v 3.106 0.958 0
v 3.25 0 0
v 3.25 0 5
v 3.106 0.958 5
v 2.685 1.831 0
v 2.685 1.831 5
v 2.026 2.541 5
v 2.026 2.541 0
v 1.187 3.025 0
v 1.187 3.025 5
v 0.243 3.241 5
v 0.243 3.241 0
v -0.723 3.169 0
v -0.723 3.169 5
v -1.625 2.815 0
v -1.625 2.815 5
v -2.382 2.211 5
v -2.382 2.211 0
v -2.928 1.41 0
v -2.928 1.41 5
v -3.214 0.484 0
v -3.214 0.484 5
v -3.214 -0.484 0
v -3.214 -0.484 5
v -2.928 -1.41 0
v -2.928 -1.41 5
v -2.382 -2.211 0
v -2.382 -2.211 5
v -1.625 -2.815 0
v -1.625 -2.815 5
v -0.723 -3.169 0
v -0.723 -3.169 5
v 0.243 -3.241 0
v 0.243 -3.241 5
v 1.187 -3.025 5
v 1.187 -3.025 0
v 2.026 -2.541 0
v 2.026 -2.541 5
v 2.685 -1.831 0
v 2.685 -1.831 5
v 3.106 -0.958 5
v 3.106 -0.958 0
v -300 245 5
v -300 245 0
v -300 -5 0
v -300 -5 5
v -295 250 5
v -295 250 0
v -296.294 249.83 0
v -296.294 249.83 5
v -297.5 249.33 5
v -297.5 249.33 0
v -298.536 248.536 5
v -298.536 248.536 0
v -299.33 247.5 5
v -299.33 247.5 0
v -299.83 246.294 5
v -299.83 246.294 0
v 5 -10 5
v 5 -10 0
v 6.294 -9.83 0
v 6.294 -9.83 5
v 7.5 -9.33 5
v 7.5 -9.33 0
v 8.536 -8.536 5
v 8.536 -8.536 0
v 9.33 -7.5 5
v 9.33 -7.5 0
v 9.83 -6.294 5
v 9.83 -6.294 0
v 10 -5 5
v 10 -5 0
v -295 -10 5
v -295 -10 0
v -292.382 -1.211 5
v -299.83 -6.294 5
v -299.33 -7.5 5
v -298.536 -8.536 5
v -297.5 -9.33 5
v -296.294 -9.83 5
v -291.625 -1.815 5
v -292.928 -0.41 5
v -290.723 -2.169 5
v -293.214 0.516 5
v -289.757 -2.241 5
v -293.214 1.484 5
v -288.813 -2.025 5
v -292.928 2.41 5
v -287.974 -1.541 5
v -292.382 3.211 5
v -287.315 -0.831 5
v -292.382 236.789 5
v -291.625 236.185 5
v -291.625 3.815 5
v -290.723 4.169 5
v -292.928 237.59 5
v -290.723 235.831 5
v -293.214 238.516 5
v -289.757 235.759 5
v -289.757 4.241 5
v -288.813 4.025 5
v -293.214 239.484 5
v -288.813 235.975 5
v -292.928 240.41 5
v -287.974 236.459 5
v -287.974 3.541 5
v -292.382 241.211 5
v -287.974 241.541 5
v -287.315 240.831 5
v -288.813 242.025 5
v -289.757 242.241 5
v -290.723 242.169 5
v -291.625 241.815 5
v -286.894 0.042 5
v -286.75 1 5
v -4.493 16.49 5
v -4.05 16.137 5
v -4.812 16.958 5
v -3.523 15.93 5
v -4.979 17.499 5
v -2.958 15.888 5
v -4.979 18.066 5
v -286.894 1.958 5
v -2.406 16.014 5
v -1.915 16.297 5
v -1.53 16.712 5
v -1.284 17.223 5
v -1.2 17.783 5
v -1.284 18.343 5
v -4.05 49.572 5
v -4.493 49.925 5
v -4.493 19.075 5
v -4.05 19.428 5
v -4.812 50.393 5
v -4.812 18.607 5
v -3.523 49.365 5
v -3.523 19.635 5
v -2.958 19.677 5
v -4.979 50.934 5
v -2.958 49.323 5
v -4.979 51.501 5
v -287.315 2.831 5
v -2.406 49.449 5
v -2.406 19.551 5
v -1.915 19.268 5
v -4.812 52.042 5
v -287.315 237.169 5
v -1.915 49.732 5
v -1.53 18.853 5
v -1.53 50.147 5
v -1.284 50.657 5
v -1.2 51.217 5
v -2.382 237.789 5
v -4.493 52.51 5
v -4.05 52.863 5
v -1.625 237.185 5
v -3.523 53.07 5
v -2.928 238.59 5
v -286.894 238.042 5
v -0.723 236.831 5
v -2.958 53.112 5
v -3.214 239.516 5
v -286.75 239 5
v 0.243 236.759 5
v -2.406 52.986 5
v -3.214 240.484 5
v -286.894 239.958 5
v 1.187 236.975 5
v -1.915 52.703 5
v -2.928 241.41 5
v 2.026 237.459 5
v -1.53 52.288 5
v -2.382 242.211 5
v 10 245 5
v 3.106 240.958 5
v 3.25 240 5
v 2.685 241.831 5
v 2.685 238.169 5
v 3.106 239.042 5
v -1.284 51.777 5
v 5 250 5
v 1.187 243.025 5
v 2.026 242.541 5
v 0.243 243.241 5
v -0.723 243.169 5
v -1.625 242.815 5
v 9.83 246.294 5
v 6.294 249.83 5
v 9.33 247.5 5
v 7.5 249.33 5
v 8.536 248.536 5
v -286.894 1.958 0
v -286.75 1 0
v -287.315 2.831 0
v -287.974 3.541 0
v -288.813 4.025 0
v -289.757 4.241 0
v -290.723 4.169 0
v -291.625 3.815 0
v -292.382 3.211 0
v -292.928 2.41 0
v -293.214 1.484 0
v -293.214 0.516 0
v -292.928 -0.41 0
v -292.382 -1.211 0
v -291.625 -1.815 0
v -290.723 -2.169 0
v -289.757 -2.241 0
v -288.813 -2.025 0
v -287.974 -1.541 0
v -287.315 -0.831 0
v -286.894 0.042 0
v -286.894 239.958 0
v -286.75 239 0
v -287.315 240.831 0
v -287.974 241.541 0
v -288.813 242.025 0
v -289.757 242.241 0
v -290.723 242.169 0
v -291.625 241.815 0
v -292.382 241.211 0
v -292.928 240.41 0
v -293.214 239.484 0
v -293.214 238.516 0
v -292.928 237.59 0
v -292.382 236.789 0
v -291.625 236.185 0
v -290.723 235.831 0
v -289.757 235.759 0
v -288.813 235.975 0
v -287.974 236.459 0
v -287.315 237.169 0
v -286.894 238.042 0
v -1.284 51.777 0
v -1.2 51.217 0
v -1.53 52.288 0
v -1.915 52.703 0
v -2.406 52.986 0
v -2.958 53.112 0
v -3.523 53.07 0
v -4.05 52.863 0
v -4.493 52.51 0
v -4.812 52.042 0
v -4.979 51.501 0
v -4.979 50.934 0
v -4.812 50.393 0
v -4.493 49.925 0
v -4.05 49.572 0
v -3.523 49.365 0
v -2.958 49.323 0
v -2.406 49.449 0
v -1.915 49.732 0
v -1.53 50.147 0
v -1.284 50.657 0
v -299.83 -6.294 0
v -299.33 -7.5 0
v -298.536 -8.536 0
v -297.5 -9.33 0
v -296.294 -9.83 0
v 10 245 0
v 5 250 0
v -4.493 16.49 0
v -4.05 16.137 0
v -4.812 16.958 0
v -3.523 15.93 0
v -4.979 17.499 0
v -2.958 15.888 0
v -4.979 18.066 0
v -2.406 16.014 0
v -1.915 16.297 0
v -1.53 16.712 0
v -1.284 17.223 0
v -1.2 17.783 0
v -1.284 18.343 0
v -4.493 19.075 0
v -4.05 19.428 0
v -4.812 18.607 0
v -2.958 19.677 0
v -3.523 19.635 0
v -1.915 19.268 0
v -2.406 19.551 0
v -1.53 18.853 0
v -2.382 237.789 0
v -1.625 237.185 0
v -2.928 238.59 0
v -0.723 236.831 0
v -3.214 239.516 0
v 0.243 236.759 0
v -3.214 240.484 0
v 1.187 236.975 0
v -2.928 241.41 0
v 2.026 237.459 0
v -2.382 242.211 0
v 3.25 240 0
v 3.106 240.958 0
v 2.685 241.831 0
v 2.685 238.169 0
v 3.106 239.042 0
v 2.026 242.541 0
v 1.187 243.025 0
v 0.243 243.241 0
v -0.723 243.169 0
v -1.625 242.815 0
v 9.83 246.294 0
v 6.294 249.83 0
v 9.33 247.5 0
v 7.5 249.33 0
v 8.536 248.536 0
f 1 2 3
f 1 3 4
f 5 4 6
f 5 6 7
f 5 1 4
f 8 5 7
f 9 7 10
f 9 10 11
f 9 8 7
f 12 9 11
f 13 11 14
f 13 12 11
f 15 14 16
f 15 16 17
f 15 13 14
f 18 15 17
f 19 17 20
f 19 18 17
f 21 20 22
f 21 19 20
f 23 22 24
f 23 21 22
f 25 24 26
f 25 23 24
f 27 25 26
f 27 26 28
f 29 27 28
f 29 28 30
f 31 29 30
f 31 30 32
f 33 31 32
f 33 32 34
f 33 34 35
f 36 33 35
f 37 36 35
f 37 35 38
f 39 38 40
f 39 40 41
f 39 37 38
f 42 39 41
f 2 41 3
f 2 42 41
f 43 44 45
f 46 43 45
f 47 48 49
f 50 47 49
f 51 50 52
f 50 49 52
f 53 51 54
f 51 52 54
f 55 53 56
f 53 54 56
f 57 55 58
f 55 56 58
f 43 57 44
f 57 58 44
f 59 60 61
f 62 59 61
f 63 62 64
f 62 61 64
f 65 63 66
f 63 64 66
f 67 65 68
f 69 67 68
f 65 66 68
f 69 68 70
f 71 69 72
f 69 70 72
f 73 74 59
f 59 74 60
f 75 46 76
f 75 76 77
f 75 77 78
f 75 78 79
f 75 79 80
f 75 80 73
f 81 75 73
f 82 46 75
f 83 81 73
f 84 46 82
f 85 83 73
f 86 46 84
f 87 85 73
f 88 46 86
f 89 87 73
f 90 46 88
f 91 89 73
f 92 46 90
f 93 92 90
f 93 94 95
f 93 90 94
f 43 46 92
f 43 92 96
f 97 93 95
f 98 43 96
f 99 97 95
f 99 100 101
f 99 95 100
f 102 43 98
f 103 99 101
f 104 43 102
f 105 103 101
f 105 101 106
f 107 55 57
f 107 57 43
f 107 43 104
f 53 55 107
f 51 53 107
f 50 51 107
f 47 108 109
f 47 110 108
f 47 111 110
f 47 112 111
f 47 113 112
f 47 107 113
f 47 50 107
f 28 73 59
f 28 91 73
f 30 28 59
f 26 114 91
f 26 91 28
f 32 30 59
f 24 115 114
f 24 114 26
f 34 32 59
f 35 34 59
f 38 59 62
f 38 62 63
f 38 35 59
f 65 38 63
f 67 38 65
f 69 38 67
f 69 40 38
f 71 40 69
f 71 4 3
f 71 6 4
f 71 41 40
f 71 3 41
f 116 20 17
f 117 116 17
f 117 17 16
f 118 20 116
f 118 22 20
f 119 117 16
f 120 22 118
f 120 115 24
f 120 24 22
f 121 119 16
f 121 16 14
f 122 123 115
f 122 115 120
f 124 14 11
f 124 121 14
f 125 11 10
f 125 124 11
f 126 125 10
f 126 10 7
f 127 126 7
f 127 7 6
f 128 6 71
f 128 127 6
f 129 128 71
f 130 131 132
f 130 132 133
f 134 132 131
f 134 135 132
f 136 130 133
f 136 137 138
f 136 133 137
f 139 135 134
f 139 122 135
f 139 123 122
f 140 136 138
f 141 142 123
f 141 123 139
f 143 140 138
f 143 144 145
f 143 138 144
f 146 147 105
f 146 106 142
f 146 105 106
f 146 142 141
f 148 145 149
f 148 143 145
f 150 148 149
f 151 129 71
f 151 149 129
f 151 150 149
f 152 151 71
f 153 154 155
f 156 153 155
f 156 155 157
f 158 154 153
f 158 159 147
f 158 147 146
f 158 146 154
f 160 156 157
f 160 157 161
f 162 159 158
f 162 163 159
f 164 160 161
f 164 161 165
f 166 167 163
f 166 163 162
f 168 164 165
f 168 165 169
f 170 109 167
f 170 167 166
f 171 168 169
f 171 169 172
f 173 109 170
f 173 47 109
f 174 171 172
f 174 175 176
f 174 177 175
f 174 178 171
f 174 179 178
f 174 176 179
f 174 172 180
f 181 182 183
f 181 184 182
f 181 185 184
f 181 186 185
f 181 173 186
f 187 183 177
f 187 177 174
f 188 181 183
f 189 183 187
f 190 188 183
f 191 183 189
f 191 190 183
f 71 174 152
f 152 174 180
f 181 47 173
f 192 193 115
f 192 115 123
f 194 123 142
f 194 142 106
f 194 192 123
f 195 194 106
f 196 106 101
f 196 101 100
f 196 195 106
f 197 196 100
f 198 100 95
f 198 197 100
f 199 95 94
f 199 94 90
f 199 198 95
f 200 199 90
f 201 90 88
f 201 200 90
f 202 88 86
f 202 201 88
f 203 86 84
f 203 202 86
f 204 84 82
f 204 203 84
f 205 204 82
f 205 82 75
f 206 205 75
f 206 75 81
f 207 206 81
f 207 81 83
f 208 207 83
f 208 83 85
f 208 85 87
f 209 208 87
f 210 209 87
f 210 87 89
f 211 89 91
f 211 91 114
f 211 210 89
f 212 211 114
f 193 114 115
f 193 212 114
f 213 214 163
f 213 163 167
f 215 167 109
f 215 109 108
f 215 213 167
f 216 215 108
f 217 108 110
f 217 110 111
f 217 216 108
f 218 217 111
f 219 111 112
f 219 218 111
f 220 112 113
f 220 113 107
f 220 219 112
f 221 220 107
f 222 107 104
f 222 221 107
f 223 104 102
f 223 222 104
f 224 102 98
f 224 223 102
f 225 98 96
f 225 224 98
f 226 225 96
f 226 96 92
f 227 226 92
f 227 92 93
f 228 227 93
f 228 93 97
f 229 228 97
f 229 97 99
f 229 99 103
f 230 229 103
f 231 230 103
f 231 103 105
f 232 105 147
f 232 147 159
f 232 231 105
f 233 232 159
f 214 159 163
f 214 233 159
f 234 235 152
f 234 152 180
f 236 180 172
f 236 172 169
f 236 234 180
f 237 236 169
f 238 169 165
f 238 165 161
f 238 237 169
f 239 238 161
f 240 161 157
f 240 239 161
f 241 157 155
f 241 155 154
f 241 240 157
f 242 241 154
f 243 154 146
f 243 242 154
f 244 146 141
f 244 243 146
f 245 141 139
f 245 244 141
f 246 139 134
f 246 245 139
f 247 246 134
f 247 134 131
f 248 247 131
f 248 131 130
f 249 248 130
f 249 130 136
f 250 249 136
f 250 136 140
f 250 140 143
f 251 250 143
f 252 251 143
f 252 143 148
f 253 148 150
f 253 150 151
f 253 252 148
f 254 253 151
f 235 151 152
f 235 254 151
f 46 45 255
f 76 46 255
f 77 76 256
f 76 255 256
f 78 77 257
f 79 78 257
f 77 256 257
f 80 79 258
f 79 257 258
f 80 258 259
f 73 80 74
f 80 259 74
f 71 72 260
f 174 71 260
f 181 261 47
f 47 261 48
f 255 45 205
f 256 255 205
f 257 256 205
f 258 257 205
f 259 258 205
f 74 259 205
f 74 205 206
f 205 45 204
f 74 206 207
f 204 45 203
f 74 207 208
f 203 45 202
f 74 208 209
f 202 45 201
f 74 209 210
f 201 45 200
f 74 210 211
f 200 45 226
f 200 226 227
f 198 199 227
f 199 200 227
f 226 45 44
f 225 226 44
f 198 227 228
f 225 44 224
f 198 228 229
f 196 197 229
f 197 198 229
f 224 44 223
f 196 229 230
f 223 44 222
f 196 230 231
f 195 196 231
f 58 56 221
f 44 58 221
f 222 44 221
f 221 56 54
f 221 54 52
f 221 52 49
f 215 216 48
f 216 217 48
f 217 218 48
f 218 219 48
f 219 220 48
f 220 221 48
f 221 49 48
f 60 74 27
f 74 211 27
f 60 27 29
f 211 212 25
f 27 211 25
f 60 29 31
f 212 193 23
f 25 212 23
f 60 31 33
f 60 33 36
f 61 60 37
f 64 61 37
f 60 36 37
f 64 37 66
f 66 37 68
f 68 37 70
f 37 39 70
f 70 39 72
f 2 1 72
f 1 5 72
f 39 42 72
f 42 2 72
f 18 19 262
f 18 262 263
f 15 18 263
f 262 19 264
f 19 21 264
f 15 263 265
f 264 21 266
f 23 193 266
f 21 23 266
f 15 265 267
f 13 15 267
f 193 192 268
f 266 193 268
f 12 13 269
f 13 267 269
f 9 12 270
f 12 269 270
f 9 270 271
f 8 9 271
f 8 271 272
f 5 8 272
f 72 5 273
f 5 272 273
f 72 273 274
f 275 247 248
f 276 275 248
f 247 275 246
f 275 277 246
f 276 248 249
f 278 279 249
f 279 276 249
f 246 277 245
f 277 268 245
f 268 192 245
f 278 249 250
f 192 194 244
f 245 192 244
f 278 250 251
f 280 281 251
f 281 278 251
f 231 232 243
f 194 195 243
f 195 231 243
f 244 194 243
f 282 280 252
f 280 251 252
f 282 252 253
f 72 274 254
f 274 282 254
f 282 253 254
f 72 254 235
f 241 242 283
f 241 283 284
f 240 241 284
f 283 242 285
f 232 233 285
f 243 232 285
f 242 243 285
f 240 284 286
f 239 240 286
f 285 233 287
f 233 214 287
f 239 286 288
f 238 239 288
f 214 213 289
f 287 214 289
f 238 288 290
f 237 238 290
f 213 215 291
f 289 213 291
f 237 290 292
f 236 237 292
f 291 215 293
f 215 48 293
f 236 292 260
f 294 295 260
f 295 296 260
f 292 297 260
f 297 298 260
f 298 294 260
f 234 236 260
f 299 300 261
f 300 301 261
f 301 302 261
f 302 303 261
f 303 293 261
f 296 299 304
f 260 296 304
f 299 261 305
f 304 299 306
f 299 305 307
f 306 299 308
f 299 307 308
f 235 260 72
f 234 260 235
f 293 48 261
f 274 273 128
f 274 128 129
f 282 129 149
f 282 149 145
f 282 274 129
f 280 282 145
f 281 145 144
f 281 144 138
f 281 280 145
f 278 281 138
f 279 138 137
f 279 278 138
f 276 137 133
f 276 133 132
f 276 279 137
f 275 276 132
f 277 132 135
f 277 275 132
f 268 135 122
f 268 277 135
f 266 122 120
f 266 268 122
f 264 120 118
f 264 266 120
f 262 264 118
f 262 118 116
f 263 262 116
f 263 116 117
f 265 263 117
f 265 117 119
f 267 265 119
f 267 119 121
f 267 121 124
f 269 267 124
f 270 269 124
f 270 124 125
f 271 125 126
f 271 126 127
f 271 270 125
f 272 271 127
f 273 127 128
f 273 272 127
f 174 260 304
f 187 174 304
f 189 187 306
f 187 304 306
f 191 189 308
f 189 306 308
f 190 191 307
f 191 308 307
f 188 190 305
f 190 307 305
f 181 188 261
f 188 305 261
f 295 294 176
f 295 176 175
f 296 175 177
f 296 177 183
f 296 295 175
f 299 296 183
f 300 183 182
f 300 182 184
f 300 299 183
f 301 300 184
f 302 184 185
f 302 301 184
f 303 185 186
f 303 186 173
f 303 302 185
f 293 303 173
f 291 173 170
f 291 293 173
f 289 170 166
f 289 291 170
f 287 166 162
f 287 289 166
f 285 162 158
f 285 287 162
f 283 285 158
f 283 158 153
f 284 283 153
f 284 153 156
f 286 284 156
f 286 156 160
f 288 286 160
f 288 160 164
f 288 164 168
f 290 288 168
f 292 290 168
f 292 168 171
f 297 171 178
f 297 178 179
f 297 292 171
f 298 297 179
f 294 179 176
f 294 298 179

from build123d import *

# Parameters (mm, degrees)
SKETCH1_R           = 3.25
SKETCH1_R_2         = 1.9
BOSS_EXTRUDE1_DEPTH = 5


with BuildPart() as part:
    # Sketch1 → Boss-Extrude1 (new body)
    with BuildSketch(Plane.XY):
        with BuildLine():
            Line((-295, -10), (5, -10))
            ThreePointArc((5, -10), (8.535533906, -8.535533906), (10, -5))
            Line((10, -5), (10, 245))
            ThreePointArc((10, 245), (8.535533906, 248.535533906), (5, 250))
            Line((5, 250), (-295, 250))
            ThreePointArc((-295, 250), (-298.535533906, 248.535533906), (-300, 245))
            Line((-300, 245), (-300, -5))
            ThreePointArc((-300, -5), (-298.535533906, -8.535533906), (-295, -10))
        make_face()
        Circle(SKETCH1_R, mode=Mode.SUBTRACT)
        with Locations((0, 240)):
            Circle(SKETCH1_R, mode=Mode.SUBTRACT)
        with Locations((-290, 239)):
            Circle(SKETCH1_R, mode=Mode.SUBTRACT)
        with Locations((-290, 1)):
            Circle(SKETCH1_R, mode=Mode.SUBTRACT)
        with Locations((-3.100000029, 17.782619509)):
            Circle(SKETCH1_R_2, mode=Mode.SUBTRACT)
        with Locations((-3.100000029, 51.217380491)):
            Circle(SKETCH1_R_2, mode=Mode.SUBTRACT)
    extrude(amount=BOSS_EXTRUDE1_DEPTH)


solid = part.part
